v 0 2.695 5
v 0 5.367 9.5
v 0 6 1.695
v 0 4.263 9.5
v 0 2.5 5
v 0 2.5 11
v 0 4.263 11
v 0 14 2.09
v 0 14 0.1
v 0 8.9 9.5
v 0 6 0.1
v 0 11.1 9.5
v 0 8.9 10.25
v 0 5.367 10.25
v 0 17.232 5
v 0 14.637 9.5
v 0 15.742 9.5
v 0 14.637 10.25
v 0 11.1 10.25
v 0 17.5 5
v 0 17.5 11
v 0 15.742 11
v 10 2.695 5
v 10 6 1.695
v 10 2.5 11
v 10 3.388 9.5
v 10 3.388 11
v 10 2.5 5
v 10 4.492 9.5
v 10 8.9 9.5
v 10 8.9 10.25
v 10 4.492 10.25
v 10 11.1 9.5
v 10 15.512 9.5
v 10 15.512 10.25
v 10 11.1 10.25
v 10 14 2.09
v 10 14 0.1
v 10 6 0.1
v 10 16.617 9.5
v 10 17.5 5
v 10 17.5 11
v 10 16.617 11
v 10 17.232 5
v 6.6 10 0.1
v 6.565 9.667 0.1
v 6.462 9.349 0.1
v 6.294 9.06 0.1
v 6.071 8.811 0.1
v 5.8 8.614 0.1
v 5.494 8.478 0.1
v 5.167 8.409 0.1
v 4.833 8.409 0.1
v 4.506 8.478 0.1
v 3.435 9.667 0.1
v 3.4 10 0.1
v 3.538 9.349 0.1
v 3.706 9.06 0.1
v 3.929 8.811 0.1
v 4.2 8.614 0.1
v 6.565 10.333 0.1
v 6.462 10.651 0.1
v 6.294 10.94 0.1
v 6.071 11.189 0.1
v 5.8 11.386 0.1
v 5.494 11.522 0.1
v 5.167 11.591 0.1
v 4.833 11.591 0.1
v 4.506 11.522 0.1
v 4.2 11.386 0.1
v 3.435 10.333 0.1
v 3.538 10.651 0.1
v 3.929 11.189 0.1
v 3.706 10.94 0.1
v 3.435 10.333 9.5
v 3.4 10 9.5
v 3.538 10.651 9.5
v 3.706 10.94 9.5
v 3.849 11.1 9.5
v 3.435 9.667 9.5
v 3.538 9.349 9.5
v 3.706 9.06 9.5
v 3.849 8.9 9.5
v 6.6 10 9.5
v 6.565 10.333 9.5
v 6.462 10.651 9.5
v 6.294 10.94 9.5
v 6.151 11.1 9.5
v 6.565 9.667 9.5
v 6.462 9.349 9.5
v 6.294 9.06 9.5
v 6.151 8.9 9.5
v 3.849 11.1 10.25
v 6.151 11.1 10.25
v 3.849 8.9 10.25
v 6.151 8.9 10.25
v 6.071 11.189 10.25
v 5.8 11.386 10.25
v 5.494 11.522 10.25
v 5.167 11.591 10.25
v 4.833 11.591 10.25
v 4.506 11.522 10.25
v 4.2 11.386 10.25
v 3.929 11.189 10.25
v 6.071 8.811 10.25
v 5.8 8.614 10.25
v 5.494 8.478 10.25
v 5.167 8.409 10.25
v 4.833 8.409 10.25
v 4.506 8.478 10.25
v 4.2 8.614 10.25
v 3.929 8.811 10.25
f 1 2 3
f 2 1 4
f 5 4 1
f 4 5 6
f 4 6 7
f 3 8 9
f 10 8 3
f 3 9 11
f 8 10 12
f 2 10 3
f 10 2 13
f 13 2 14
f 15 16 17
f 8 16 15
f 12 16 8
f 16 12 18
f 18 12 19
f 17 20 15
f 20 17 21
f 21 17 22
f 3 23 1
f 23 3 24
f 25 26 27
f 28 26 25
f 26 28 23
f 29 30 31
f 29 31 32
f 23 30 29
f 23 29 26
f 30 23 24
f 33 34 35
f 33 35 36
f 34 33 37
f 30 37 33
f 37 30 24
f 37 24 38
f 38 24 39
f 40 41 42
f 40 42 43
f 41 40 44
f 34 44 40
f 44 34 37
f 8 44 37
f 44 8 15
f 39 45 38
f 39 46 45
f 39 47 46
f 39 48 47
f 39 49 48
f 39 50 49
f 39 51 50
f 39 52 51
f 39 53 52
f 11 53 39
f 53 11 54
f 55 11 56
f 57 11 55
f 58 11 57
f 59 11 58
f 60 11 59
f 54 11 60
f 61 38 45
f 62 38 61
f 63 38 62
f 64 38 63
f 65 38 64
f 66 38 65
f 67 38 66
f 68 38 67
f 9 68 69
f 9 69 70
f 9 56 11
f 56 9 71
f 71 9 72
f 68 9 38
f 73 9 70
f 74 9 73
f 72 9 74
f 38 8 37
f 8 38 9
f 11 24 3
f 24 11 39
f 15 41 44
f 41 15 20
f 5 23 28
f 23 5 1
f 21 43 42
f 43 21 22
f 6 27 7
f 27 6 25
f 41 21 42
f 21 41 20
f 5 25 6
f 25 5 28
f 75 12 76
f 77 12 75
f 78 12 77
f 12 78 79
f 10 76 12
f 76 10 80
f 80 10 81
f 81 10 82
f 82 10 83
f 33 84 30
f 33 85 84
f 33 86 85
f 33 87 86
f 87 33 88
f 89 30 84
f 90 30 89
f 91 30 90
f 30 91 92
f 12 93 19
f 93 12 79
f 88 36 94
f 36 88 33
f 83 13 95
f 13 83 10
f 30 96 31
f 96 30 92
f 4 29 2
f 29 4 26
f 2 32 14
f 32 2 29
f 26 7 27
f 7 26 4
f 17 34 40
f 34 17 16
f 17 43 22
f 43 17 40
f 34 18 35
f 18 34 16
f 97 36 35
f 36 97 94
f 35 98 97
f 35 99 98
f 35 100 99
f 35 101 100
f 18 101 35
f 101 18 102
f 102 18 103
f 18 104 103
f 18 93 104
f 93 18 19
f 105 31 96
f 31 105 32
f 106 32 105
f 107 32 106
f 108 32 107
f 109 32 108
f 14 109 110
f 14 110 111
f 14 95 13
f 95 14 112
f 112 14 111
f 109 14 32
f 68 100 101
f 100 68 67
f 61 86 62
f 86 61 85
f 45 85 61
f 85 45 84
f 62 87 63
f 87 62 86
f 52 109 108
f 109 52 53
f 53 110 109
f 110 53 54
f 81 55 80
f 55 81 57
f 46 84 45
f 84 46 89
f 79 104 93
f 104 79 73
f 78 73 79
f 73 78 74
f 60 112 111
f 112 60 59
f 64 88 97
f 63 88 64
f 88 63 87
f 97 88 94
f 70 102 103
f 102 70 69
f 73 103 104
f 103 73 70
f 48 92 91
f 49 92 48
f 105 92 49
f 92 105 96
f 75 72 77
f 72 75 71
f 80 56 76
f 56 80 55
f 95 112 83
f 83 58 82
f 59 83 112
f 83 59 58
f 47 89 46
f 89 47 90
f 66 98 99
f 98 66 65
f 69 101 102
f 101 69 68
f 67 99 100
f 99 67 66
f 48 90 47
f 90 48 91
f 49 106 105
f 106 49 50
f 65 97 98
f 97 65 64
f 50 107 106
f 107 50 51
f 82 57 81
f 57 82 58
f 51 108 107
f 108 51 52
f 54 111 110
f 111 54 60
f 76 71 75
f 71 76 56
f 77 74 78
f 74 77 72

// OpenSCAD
x = 2;
gX = 15; gY = 20; gZ = 2;
gXoff = -2.5;
bX = 10; bY = 15; bZ = 3+3;
bYY = 12.6;

rX = 12;rY=1.1;rZ=1.5;

arm_length=43.5; // [30:70]

translate([0,0,11])
mirror([0,0,1])
sliderMain() ;




module sliderMain() {

difference() {
  union() {
  //mirror([0,0,1]) 
    //translate([arm_length,(bY+5)/2,-8])  armv3();
  
    //main body
   color ("blue") 
       translate([0,(gY-bY)/2,0])
       cube([bX,bY,bZ]);
   
    translate([0,10,3.9]) {
   rotate([135,0,0])  translate([0,1.15,-1.15]) cube([bX,5.5,5]);
        
   rotate([318,0,0])  translate([0,-1.40,+1.40]) cube([bX,5.5,5]);
      
   translate([0,(-8)/2,0])
      cube([bX,8,7]);
    }
    
  }
    /* color("pink") translate([20,(bY+5)/2,.25]) hull() {
       
      translate([0,0,5.5]) cylinder(r=3.2,h=.5,center=true,$fn=32);
      translate([-14.7,0,5.5]) cylinder(r=2,h=.5,center=true,$fn=32);
    }
    */
  
    color ("red") {
    //center slot
    translate([-rY,(gY-rY*2)/2,0])
        cube ([rX,rY*2,rZ]);

    //left slot
    translate([-1,(gY-bYY-rY)/2+1.2,0]) 
        rotate([0,0,-5])
        cube ([rX,rY,rZ]);
    //right slot
    translate([-1,(gY+bYY+rY)/2-1.2-rY,0]) 
        rotate([0,0,5]) 
        cube ([rX,rY,rZ]);
    }
    //bottom clearance
    translate([0,(gY-11.2)/2,0]) 
        cube([bX,11.2,.75]); 
    
    /* 
    //slot hole  
    translate([0,(gY-5)/2,2.6]) 
       cube([bX,5.5,2 ]);
    */  
    
    translate([gY/4,gY/2,-5])
        cylinder(d=3.2,h=20,$fn=30);
    
    //translate([arm_length-10,gY/2,0])
    //    cylinder(d=2,h=10,$fn=30);
}


/*
//slot hole supports
translate([0,(gY-.2)/2+2,2.6]) 
cube([bX,.2,2]);

translate([0,(gY-.2)/2-2,2.6]) 
cube([bX,.2,2]);
*/
}
//translate([bX,(gY-12.6)/2,0]) cube([1,12.6,1]);
//translate([0,(gY-11.5)/2,0]) cube([1,11.5,1]);



module armv3() {
  //  rotate([180,0,0]) 
  difference() {
      // body
      union() {
      cylinder(r=6, h=4,center=true,$fn=32);
      translate([-arm_length/2,0,0]) cube([arm_length,8,4],center=true);


      }
      
    // hole for servo spindle
    cylinder(r=3.8,h=10,center=true,$fn=32); 

    // slot for servo arm
    hull() {
      translate([0,0,5.5]) cylinder(r=3.2,h=10,center=true,$fn=32);
      translate([-14.7,0,5.5]) cylinder(r=2,h=10,center=true,$fn=32);
    }
 
    }

   //rotate([135,0,0])  translate([-arm_length,1.15,-1.15]) cube([bX,5.5,5]);
        
   // rotate([318,0,0])  translate([-arm_length,-1.40,+1.40]) cube([bX,5.5,5]);
}
